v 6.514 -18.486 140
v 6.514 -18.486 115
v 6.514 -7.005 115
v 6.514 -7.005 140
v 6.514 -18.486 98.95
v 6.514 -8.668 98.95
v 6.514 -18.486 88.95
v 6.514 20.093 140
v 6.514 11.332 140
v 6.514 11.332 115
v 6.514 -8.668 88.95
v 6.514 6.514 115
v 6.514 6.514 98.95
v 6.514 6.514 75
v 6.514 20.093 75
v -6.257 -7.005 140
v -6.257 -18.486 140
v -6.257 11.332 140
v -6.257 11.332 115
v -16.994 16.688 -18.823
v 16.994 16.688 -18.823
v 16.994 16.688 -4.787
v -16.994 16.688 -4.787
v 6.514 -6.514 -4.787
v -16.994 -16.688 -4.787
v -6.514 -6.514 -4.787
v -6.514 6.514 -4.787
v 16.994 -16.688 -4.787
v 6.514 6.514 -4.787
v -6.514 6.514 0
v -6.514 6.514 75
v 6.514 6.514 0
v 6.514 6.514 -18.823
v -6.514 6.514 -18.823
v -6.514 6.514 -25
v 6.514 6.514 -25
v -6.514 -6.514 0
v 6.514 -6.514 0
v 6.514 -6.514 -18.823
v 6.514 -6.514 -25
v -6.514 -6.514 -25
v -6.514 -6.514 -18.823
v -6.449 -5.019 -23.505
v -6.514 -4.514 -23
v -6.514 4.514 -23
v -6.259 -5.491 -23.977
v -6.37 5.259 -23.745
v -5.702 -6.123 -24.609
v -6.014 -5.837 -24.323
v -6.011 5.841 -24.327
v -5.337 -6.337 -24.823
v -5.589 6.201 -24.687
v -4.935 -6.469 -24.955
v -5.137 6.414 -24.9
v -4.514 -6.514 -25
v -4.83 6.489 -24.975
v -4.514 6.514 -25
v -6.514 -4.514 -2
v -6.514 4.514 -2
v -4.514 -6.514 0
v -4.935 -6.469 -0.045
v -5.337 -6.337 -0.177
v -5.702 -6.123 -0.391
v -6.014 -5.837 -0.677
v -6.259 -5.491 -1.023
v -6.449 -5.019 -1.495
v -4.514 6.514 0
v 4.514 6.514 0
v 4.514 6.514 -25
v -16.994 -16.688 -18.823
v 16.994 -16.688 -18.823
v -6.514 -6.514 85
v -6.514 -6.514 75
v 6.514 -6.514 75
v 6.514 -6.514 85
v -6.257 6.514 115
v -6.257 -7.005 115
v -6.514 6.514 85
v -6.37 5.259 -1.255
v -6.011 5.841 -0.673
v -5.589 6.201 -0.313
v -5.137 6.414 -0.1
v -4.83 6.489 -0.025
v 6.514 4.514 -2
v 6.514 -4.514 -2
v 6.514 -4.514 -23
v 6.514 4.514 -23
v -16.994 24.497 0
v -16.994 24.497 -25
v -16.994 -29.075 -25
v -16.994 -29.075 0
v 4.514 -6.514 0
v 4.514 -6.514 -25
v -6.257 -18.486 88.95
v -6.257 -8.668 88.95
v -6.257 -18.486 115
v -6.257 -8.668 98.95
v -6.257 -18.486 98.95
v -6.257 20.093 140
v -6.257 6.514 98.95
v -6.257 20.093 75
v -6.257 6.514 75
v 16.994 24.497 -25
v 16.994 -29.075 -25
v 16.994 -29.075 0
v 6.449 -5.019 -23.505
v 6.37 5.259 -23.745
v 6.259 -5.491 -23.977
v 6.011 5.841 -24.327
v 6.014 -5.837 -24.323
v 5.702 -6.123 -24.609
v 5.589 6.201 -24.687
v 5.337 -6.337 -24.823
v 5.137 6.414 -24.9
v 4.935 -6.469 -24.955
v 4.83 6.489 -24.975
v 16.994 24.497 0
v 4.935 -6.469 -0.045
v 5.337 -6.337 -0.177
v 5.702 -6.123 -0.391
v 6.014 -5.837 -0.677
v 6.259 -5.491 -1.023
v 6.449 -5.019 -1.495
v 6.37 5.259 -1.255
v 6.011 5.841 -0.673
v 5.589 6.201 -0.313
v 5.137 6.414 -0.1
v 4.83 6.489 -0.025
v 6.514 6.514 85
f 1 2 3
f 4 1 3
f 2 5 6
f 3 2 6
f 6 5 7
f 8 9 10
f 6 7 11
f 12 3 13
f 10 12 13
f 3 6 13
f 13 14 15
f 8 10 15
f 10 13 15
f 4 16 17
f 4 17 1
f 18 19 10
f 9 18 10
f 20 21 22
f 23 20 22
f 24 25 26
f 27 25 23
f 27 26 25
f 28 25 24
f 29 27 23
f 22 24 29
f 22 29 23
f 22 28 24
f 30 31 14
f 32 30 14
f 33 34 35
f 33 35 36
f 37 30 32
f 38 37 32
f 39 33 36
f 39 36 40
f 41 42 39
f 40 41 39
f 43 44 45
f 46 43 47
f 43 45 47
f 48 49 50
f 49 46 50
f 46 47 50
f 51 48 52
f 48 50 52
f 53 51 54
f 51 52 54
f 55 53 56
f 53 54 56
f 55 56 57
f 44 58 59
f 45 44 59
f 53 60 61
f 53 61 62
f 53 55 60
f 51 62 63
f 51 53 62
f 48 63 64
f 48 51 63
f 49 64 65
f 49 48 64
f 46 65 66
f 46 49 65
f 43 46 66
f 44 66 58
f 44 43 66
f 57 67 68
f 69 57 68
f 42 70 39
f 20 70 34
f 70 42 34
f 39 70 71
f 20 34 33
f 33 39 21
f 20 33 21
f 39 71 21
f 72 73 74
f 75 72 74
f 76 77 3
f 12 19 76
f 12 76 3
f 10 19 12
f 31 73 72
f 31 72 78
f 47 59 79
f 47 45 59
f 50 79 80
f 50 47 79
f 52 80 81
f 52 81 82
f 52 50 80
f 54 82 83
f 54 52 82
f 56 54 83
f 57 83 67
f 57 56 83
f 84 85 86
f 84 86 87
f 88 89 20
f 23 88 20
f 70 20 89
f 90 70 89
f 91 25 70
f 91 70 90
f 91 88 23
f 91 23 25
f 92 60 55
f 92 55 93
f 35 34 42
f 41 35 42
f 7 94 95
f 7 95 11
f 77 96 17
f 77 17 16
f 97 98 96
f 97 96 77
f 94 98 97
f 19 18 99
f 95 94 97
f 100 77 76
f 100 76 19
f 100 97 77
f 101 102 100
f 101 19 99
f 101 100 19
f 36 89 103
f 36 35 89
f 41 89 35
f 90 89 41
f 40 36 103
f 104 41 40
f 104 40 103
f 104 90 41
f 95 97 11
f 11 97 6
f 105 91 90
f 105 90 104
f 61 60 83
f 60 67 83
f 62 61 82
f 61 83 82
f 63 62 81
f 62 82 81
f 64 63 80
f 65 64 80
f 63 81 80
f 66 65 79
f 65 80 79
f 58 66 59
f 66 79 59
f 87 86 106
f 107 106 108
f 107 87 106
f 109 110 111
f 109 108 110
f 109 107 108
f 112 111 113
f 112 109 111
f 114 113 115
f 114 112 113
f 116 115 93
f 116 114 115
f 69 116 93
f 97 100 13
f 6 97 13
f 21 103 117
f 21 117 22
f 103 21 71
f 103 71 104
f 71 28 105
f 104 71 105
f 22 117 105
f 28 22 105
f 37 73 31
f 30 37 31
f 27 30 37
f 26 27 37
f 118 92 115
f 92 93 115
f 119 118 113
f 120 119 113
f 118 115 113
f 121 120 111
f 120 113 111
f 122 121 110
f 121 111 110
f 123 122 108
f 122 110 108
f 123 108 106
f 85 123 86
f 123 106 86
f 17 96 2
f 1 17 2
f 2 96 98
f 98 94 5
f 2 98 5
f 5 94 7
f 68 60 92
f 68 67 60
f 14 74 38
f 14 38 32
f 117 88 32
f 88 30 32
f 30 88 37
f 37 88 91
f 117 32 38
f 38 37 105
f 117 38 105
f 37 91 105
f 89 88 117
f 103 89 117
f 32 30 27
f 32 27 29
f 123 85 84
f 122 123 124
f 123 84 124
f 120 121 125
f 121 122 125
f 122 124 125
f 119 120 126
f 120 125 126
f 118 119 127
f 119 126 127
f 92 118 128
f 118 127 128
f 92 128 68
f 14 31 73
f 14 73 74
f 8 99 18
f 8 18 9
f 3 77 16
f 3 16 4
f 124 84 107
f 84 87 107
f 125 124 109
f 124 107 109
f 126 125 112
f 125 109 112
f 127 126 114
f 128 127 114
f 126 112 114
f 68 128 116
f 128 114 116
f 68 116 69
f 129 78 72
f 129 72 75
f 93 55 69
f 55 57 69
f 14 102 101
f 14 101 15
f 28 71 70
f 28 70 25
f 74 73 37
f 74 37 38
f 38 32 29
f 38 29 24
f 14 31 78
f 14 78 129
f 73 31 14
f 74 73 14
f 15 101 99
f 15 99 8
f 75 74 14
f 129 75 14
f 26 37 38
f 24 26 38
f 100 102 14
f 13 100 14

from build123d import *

# Parameters (mm, degrees)
F0_W      = 13.0280144513
F0_H      = 13.0280144513
F1_DEPTH  = 75
F2_W      = 33.9875258505
F2_H      = 53.5712684505
F2_W_2    = 13.0280144513
F2_H_2    = 13.0280144513
F3_DEPTH  = 25
F4_DEPTH  = 25
F5_W      = 33.3761908114
F5_H      = 14.0360295773
F6_DEPTH  = 34
F7_W      = 12.7713497204
F7_H      = 13.5793518275
F8_DEPTH  = 25
F9_DEPTH  = 10
F10_DEPTH = 15
F11_W     = 12.7713497204
F11_H     = 16.0501429439
F12_DEPTH = 25
F13_W     = 12.7713497204
F13_H     = 9.8180785775
F14_DEPTH = 10
F15_W     = 12.7713497204
F15_H     = 11.4813564345
F16_DEPTH = 25
F17_W     = 12.7713497204
F17_H     = 8.7616005912
F18_DEPTH = 25
F19_R     = 2
F20_R     = 2


with BuildPart() as f1:
    # F0 (on Top) → F1 (new body)
    with BuildSketch(Plane.XY):
        Rectangle(F0_W, F0_H)
    extrude(amount=F1_DEPTH)


with BuildPart() as f3:
    # F2 (on face) → F3 (new body)
    with BuildSketch(Plane(origin=(0, 0, 0), x_dir=(1, 0, 0), z_dir=(0, 0, -1))):
        with Locations((0, 2.289036056)):
            Rectangle(F2_W, F2_H)
        Rectangle(F2_W_2, F2_H_2, mode=Mode.SUBTRACT)
    extrude(amount=F3_DEPTH)

    # F5 (on face) → F6 (cut)
    with BuildSketch(Plane.YZ.offset(16.9937629253)):
        with Locations((0, -11.8051227182)):
            Rectangle(F5_W, F5_H)
    extrude(amount=-F6_DEPTH, mode=Mode.SUBTRACT)


with BuildPart() as f4:
    # F4 (new): a face of the model
    f4_faces = [f1.part.faces().sort_by_distance(p)[0] for p in [
        (0, 0, 0),
    ]]
    extrude(f4_faces, amount=F4_DEPTH)

    # F19
    f19_edges = [f4.edges().sort_by_distance(p)[0] for p in [
        (6.514007, -6.514007, -12.5),
        (6.514007, 6.514007, -12.5),
        (6.514007, 0, 0),
        (6.514007, 0, -25),
    ]]
    fillet(f19_edges, radius=F19_R)

    # F20
    f20_edges = [f4.edges().sort_by_distance(p)[0] for p in [
        (-6.514007, 6.514007, -12.5),
        (-6.514007, -6.514007, -12.5),
        (-6.514007, 0, 0),
        (-6.514007, 0, -25),
    ]]
    fillet(f20_edges, radius=F20_R)


with BuildPart() as f8:
    # F7 (on face) → F8 (new body)
    with BuildSketch(Plane.XY.offset(75)):
        with Locations((0.1283323654, 13.3036831394)):
            Rectangle(F7_W, F7_H)
    extrude(amount=F8_DEPTH)

    # F10 (add): a face of the model
    f10_faces = [f8.faces().sort_by_distance(p)[0] for p in [
        (0.1283323654, 13.3036831394, 100),
    ]]
    extrude(f10_faces, amount=F10_DEPTH)

    # F11 (on face) → F12 (join)
    with BuildSketch(Plane.XZ.offset(-6.5140072256)):
        with Locations((0.1283323654, 106.9749285281)):
            Rectangle(F11_W, F11_H)
    extrude(amount=F12_DEPTH)

    # F13 (on face) → F14 (join)
    with BuildSketch(Plane(origin=(0, 0, 98.9498570561), x_dir=(1, 0, 0), z_dir=(0, 0, -1))):
        with Locations((0.1283323654, 13.5769534856)):
            Rectangle(F13_W, F13_H)
    extrude(amount=F14_DEPTH)

    # F15 (on face) → F16 (join)
    with BuildSketch(Plane.XY.offset(115)):
        with Locations((0.1283323654, -12.7453145571)):
            Rectangle(F15_W, F15_H)
    extrude(amount=F16_DEPTH)

    # F17 (on face) → F18 (join)
    with BuildSketch(Plane.XY.offset(115)):
        with Locations((0.1283323654, 15.7125587575)):
            Rectangle(F17_W, F17_H)
    extrude(amount=F18_DEPTH)


with BuildPart() as f9:
    # F9 (new): a face of the model
    f9_faces = [f1.part.faces().sort_by_distance(p)[0] for p in [
        (0, 0, 75),
    ]]
    extrude(f9_faces, amount=F9_DEPTH)


solid = Compound([f1.part, f3.part, f4.part, f8.part, f9.part])
